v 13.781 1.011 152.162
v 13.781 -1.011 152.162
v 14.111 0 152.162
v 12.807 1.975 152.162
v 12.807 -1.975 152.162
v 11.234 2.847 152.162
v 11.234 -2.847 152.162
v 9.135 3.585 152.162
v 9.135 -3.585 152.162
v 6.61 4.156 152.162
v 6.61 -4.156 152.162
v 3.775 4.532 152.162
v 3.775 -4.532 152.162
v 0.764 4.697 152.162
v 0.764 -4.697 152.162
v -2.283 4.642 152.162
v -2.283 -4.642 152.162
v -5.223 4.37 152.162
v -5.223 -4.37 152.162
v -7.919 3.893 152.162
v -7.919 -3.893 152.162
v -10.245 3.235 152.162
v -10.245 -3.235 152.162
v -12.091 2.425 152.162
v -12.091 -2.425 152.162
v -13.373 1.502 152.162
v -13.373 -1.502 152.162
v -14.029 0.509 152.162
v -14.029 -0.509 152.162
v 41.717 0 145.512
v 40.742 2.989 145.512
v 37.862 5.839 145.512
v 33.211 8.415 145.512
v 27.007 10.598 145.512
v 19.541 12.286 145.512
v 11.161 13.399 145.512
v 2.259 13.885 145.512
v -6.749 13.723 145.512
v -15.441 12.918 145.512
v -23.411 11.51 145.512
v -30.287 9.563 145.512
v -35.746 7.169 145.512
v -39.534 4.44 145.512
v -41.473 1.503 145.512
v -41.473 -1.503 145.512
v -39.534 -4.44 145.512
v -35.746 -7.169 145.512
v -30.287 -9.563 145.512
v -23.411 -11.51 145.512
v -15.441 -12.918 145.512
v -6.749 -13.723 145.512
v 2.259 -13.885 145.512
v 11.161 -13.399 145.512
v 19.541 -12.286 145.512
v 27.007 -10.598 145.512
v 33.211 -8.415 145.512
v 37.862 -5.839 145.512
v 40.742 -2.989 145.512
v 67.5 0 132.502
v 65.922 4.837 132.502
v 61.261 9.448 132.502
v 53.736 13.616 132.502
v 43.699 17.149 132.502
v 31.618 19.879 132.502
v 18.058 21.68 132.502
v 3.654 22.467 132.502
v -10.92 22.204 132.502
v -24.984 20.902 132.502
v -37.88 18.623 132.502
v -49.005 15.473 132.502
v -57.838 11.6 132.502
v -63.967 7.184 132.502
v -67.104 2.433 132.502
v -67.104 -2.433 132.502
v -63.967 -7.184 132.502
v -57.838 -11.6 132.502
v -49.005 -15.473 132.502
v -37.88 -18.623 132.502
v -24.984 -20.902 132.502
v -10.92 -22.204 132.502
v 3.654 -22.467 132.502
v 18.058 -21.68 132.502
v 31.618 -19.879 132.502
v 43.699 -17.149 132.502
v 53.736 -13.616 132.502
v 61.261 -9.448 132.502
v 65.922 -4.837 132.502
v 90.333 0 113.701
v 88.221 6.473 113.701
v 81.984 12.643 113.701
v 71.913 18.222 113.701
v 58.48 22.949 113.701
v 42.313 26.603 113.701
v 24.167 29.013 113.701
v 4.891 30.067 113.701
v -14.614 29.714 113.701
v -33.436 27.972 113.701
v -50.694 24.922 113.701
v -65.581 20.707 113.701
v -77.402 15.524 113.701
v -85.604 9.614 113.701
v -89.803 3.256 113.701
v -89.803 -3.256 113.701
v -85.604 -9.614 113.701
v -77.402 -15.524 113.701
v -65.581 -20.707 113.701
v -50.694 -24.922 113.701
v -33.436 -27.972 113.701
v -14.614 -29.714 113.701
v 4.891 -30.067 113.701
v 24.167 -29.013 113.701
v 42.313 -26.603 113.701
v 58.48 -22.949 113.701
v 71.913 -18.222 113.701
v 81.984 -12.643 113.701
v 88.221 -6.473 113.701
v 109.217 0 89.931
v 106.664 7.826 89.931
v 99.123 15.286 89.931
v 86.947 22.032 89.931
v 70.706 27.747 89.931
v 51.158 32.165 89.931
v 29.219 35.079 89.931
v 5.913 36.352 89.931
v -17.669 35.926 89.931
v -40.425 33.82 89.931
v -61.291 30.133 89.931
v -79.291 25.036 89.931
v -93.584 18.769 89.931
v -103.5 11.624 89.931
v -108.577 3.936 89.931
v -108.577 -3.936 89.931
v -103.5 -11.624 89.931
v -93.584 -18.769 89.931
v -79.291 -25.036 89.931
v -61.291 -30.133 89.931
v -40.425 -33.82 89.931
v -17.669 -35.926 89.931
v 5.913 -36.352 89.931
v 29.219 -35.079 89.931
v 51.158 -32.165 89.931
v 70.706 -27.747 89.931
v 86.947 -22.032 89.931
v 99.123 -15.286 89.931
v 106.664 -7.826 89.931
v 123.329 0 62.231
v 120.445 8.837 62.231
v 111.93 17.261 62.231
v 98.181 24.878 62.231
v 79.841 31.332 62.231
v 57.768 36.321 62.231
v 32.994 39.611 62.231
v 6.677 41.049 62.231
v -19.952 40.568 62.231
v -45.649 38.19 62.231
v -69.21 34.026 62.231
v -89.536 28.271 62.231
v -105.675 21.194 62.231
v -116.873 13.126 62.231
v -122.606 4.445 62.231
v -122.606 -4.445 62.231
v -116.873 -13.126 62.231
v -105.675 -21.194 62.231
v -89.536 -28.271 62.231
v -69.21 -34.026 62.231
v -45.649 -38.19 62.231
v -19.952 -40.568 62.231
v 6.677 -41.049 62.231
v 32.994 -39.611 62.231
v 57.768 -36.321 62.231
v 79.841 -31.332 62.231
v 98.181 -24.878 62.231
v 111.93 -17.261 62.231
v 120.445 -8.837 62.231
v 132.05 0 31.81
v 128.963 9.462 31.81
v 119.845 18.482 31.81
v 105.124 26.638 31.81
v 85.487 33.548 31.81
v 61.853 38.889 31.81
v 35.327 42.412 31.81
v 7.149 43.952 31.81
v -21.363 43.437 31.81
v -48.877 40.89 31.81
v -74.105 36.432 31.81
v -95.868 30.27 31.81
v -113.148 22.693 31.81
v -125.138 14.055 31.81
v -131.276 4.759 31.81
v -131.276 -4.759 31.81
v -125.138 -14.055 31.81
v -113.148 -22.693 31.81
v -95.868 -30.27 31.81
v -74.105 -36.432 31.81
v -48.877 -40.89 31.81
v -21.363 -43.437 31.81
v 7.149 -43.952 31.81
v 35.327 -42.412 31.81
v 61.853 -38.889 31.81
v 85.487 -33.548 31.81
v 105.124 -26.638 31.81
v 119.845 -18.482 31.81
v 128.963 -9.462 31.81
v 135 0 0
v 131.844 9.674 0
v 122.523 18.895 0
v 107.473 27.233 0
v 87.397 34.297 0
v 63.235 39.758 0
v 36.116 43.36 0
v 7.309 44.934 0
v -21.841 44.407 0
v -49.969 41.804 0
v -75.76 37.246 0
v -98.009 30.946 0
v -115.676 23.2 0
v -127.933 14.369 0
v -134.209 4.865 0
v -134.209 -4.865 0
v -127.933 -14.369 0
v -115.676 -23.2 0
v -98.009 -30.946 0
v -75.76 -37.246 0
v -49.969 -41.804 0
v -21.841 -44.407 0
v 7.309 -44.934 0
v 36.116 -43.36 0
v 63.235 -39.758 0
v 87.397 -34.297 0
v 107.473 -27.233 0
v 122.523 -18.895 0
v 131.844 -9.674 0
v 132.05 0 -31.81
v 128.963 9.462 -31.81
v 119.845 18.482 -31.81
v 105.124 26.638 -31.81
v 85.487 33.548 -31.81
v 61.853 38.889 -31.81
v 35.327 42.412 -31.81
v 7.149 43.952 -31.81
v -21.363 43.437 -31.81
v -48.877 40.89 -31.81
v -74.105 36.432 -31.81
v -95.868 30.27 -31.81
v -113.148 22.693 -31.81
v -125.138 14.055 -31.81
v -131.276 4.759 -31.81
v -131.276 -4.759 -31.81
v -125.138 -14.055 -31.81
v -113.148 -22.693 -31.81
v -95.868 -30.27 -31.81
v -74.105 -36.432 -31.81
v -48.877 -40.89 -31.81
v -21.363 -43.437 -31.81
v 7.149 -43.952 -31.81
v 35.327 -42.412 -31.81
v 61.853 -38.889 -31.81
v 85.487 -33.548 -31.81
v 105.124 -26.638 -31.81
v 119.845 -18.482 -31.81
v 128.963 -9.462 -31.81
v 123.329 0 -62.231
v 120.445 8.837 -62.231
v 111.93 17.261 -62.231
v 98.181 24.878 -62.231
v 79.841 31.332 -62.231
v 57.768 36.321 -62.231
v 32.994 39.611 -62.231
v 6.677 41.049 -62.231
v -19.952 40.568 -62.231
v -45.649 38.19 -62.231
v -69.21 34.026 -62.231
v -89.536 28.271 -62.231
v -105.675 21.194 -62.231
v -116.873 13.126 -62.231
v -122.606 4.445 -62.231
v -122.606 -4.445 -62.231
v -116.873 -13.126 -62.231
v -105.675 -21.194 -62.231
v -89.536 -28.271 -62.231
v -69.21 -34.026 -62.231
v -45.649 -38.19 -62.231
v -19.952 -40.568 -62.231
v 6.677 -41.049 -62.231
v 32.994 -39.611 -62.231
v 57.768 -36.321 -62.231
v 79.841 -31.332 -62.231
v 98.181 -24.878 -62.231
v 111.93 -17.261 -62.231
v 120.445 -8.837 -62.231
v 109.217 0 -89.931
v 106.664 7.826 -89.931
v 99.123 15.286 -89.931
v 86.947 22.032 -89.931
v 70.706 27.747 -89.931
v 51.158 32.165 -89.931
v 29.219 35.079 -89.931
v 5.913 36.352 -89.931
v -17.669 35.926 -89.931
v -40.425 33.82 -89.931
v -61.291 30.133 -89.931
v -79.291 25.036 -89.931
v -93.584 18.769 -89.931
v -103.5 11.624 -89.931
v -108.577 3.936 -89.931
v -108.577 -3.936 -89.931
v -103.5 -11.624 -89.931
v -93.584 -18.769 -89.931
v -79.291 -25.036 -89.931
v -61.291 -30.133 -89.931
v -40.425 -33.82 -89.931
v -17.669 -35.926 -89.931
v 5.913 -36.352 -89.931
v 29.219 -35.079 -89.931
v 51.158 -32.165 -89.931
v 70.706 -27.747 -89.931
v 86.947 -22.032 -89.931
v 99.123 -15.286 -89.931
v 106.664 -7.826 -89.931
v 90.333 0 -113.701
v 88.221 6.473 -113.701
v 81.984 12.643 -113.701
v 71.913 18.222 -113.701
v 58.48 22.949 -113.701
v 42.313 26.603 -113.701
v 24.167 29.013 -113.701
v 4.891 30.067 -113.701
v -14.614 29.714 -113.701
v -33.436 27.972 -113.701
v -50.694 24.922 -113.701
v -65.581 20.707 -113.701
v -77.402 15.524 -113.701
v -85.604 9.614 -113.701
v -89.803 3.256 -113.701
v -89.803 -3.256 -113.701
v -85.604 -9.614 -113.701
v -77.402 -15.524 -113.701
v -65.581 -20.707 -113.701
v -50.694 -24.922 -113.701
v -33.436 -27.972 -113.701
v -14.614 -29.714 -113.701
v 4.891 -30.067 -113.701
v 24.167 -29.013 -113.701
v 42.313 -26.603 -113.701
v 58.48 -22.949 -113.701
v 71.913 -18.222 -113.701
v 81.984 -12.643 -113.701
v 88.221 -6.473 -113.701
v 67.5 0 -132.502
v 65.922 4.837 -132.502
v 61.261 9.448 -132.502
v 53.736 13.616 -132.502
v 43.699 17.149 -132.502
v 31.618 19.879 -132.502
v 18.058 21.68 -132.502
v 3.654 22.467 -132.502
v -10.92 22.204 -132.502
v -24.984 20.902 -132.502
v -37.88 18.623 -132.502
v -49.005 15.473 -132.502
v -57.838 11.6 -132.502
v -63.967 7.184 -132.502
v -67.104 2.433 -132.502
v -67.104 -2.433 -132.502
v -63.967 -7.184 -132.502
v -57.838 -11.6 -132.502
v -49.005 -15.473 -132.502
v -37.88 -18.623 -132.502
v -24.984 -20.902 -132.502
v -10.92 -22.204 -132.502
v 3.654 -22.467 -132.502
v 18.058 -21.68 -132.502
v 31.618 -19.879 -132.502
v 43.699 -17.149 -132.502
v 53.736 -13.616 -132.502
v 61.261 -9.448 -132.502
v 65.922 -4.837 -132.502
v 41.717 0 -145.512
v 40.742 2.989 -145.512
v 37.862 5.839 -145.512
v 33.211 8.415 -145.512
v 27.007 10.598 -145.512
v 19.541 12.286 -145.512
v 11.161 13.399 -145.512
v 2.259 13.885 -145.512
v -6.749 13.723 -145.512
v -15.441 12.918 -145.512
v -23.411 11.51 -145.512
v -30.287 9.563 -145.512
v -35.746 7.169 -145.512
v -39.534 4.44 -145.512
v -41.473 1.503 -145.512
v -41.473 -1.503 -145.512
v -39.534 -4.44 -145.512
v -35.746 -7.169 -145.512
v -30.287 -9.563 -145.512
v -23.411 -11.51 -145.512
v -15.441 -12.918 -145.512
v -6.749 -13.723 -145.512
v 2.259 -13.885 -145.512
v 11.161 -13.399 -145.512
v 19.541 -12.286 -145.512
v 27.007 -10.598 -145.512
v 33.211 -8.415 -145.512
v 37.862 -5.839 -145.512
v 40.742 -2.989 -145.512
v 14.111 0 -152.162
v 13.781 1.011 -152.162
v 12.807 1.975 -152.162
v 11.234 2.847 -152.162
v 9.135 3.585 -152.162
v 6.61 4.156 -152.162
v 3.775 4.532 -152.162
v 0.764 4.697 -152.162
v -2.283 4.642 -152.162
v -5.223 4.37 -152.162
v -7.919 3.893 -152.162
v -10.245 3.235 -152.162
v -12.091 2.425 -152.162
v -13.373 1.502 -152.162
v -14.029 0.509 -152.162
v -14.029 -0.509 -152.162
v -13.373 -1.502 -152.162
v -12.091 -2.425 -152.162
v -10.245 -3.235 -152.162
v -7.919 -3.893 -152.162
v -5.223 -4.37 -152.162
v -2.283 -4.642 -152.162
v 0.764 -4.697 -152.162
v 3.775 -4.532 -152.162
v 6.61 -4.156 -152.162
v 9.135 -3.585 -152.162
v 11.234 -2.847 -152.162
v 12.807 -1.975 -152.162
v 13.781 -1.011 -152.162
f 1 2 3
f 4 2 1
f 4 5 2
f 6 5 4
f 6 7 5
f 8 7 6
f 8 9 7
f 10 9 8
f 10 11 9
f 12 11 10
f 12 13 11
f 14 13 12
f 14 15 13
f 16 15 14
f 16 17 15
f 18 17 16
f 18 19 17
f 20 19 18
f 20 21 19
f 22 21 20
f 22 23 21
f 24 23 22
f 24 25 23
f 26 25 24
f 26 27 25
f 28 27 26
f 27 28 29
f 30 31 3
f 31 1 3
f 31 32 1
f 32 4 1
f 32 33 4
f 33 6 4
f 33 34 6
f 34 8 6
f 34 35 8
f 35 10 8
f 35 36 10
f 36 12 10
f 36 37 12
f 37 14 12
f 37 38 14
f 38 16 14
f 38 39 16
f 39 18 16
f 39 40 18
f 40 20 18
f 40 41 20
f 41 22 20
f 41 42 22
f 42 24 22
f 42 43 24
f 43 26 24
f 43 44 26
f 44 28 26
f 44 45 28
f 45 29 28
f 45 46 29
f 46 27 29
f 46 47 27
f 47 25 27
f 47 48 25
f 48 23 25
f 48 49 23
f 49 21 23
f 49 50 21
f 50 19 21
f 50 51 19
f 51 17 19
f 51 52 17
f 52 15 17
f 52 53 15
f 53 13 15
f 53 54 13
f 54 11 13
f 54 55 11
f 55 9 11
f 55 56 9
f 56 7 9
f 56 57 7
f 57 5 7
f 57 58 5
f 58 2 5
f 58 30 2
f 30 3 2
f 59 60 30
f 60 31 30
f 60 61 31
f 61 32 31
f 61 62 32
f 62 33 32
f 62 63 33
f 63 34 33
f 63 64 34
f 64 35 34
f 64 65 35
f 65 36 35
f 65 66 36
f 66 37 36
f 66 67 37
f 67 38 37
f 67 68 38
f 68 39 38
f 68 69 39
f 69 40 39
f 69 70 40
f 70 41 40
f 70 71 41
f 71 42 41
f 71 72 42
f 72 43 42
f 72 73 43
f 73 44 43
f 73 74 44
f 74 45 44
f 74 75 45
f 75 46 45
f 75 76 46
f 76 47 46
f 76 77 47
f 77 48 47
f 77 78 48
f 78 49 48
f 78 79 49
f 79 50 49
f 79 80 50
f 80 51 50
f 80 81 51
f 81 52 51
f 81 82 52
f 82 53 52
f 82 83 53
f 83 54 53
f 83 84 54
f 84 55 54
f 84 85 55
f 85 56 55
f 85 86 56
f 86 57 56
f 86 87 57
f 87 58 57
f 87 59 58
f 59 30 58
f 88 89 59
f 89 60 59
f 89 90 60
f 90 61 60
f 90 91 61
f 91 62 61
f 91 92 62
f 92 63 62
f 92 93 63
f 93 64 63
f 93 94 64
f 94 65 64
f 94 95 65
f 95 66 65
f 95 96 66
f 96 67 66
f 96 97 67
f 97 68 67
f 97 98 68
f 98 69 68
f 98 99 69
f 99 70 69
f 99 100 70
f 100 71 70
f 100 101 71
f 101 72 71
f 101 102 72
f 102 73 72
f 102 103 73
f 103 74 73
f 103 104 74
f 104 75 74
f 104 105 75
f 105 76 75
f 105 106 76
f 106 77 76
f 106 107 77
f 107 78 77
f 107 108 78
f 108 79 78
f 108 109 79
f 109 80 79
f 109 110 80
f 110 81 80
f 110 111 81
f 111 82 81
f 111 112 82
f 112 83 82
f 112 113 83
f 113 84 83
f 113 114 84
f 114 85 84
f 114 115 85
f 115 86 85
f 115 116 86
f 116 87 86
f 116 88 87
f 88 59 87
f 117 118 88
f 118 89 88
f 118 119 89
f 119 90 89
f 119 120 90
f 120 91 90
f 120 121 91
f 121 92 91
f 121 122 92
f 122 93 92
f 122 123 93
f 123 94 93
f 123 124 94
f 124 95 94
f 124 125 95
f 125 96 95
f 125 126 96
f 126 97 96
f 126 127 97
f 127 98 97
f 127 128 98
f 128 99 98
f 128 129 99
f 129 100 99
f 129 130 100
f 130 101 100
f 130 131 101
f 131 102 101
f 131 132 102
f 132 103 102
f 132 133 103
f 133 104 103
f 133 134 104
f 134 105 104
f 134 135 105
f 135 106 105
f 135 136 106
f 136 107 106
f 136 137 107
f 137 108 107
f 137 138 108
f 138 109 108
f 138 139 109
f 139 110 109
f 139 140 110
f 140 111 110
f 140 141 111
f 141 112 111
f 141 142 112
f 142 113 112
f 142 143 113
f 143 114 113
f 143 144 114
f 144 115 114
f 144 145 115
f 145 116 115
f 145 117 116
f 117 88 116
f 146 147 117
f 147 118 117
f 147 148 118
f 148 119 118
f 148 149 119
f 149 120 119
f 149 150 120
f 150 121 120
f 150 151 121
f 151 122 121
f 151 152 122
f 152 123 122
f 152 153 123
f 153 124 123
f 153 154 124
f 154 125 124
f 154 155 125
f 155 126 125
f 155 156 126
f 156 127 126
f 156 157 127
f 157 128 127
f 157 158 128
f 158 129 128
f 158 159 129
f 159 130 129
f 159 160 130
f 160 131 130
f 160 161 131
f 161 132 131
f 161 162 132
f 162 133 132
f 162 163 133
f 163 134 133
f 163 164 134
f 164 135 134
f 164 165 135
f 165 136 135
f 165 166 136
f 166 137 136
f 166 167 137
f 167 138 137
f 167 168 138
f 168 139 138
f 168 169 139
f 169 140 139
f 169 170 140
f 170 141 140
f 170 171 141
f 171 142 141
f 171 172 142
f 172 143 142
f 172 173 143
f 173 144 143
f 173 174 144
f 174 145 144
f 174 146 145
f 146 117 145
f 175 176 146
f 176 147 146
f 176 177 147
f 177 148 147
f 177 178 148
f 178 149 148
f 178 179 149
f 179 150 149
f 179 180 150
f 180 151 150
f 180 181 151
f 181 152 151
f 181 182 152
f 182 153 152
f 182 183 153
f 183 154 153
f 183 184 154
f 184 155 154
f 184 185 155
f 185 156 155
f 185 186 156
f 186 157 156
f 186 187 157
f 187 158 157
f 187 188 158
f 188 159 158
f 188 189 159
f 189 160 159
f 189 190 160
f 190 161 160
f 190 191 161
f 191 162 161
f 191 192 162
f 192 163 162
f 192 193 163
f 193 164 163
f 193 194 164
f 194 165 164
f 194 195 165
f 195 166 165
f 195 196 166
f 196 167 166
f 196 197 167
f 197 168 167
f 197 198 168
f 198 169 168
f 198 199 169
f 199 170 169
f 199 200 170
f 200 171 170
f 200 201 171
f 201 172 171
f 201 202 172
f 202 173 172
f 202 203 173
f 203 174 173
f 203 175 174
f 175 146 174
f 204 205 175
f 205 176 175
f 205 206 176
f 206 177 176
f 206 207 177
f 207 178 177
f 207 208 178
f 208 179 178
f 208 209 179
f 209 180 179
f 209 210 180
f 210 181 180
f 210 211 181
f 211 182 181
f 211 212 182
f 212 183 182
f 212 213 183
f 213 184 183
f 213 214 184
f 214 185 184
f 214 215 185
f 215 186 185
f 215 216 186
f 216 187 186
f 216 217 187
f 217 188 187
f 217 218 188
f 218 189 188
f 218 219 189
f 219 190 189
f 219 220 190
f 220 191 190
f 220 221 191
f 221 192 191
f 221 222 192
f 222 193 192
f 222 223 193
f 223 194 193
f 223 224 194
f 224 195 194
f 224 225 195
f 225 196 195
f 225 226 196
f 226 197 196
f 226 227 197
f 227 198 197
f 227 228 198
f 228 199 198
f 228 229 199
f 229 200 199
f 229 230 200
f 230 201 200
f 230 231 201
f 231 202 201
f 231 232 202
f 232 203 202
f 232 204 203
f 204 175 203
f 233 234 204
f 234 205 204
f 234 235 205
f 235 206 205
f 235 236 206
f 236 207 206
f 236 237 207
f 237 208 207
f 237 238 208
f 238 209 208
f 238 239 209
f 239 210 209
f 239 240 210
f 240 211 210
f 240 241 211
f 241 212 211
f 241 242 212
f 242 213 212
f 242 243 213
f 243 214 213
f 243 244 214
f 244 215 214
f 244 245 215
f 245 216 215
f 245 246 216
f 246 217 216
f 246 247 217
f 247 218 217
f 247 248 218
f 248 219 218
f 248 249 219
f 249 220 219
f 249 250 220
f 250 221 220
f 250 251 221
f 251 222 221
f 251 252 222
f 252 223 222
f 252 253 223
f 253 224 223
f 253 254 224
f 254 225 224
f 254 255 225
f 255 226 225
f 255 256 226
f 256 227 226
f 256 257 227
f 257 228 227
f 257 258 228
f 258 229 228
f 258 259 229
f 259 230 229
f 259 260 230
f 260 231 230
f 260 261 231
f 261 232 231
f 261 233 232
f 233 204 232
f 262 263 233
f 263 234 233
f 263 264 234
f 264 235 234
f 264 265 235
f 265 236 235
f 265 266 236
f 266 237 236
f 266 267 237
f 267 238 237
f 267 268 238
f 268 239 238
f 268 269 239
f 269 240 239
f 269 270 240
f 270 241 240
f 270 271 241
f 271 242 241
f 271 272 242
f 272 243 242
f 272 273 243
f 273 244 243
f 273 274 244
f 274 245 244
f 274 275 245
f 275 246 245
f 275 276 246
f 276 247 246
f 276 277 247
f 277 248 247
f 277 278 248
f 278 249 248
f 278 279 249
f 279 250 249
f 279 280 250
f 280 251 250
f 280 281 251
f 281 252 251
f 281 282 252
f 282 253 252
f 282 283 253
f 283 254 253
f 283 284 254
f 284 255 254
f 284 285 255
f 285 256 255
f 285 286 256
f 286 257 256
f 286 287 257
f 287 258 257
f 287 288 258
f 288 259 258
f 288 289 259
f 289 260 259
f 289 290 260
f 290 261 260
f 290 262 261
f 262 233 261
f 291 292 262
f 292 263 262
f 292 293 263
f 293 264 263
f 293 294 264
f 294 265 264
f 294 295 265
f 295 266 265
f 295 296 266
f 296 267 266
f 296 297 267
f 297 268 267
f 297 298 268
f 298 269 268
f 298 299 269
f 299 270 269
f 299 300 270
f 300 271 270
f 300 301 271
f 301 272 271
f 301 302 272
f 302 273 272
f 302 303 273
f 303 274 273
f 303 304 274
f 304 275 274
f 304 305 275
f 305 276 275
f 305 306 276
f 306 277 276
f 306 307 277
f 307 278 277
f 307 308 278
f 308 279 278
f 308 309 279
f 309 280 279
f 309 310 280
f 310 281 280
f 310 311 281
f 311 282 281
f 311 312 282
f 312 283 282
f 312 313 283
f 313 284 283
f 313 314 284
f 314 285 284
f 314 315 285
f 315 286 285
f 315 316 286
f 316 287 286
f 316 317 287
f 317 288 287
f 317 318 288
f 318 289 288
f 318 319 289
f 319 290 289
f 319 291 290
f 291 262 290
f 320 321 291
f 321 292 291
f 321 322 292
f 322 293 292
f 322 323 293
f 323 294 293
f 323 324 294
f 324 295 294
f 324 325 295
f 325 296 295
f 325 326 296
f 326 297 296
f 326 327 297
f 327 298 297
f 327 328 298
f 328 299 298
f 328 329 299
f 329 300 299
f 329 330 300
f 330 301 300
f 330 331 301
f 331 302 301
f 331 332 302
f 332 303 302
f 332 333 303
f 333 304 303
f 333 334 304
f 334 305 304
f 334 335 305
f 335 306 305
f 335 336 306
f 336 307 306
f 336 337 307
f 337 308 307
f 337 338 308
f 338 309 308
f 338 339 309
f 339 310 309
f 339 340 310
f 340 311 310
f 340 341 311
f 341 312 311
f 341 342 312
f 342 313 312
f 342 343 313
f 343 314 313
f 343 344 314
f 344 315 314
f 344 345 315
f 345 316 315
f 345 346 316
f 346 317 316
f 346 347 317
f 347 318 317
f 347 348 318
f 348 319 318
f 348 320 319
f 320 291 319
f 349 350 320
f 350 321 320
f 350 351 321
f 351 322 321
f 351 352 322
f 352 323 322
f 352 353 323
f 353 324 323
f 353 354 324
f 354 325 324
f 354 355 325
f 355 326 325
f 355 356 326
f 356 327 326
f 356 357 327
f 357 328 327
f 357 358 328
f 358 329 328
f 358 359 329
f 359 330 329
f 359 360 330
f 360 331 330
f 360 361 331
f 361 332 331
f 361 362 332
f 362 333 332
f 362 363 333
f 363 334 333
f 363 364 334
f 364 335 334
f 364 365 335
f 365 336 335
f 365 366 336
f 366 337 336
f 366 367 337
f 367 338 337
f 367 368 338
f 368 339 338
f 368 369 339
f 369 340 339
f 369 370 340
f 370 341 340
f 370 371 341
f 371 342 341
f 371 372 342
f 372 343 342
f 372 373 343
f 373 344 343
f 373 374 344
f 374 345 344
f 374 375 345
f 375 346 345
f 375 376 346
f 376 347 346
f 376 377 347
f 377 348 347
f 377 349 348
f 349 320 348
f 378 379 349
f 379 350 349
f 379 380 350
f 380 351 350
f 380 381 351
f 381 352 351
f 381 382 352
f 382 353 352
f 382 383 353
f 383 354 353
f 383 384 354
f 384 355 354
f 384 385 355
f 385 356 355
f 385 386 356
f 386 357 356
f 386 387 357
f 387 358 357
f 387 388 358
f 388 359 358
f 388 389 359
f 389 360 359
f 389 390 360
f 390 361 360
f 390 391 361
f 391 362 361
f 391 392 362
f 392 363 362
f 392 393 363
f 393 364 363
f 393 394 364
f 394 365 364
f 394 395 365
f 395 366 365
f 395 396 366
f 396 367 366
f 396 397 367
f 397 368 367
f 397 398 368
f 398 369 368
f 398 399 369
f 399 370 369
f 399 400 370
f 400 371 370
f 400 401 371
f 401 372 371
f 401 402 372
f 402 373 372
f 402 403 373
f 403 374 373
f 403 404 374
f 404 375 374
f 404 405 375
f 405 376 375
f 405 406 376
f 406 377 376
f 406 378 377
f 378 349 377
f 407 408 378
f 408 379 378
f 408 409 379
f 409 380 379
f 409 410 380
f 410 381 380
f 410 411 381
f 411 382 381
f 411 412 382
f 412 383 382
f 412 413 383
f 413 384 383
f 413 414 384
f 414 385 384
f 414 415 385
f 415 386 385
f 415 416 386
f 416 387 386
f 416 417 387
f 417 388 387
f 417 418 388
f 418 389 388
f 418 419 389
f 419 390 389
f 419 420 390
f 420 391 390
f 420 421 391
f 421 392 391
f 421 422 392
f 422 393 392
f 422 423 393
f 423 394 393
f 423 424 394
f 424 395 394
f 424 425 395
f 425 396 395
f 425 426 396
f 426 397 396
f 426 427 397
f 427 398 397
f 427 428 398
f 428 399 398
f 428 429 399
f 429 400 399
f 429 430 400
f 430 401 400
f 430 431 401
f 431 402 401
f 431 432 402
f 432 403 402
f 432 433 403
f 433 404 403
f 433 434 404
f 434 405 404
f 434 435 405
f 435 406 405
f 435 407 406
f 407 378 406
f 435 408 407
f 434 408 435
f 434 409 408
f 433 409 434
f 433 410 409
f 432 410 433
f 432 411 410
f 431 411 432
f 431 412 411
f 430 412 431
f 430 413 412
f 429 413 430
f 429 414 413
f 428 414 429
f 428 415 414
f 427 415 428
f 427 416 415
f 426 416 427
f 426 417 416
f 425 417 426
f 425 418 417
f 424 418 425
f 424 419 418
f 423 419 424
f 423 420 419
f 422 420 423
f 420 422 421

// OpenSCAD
// Generated by SolidPython 1.0.1 on 2020-07-29 00:46:51


scale(v = [15, 5, 17]) {
	sphere(r = 9);
}
/***********************************************
*********      SolidPython code:      **********
************************************************
 
# import packages: SolidPython
from solid import *
from solid.utils import *
from itertools import chain, combinations, permutations


class Resize:

    def __init__(self, scad_file):
        self.scad_file = scad_file
        #self.scad_file = import_scad(scad_file)
        # cone/cylinder param:
        self.r1 = 0
        self.r2 = 0
        self.h = 0
        # rectangular prism param:
        self.w = 0
        self.l = 0
        # ellipse param:
        self.r = 0

    # import OpenScad code (file name corresponds to shape)


    # classify shape + parameters
    def assign(self, param1, param2, param3):
        if self.scad_file == 'cone.scad':
            self.r1 = param1
            self.r2 = param2
            self.h = param3
        elif self.scad_file == 'cylinder.scad':
            self.r1 = param1
            self.r2 = param2
            self.h = param3
        elif self.scad_file == 'rectangularPrism.scad':
            self.h = param1
            self.l = param2
            self.w = param3
        else:
            self.r = param1
            self.h = param2

    # resize parameters
    def iterate(self):
        x = range(3, 20, 2)
        i = 1
        if self.scad_file == 'cone.scad':
            tempList = list(permutations(x, 2))
            for temp in tempList:
                param1 = temp[0]
                param2 = temp[1]
                filepath = 'produced_scad_files/' + 'cone' + str(param1) + '_' + str(param2) + '_' + '.scad'
                scad_render_to_file(cylinder(h=param1, r1=param2, r2=0), filepath)

        elif self.scad_file == 'cylinder.scad':
            tempList = list(permutations(x, 3))
            for temp in tempList:
                param1 = temp[0]
                param2 = temp[1]
                filepath = 'produced_scad_files/' + 'cylinder' + str(param1) + '_' + str(param2) + '_' + '.scad'
                scad_render_to_file(cylinder(h=param1, r1=param2, r2=param2), filepath)

        elif self.scad_file == 'rectangularPrism.scad':
            tempList = list(permutations(x, 3))
            for temp in tempList:
                param1 = temp[0]
                param2 = temp[1]
                param3 = temp[2]
                filepath = 'produced_scad_files/' + 'rectangularPrism' + str(param1) + '_' + str(param2) + '_' + str(
                    param3) + '.scad'
                scad_render_to_file(cube(size=(param1, param2, param3)), filepath)

        elif self.scad_file == 'ellipse.scad':
            tempList = list(permutations(x, 4))
            for temp in tempList:
                param1 = temp[0]
                param2 = temp[1]
                param3 = temp[2]
                param4 = temp[3]
                filepath = 'produced_scad_files/' + 'ellipse' + str(param1) + '_' + str(param2) + '_' + str(param3) + '_' + str(param4) + '.scad'
                scad_render_to_file(scale([param1, param2, param3])(sphere(r=param4)), filepath)

    def render_to_scadfile(self):
        scad_render_to_file(scad, 'example.scad') 
 
************************************************/
